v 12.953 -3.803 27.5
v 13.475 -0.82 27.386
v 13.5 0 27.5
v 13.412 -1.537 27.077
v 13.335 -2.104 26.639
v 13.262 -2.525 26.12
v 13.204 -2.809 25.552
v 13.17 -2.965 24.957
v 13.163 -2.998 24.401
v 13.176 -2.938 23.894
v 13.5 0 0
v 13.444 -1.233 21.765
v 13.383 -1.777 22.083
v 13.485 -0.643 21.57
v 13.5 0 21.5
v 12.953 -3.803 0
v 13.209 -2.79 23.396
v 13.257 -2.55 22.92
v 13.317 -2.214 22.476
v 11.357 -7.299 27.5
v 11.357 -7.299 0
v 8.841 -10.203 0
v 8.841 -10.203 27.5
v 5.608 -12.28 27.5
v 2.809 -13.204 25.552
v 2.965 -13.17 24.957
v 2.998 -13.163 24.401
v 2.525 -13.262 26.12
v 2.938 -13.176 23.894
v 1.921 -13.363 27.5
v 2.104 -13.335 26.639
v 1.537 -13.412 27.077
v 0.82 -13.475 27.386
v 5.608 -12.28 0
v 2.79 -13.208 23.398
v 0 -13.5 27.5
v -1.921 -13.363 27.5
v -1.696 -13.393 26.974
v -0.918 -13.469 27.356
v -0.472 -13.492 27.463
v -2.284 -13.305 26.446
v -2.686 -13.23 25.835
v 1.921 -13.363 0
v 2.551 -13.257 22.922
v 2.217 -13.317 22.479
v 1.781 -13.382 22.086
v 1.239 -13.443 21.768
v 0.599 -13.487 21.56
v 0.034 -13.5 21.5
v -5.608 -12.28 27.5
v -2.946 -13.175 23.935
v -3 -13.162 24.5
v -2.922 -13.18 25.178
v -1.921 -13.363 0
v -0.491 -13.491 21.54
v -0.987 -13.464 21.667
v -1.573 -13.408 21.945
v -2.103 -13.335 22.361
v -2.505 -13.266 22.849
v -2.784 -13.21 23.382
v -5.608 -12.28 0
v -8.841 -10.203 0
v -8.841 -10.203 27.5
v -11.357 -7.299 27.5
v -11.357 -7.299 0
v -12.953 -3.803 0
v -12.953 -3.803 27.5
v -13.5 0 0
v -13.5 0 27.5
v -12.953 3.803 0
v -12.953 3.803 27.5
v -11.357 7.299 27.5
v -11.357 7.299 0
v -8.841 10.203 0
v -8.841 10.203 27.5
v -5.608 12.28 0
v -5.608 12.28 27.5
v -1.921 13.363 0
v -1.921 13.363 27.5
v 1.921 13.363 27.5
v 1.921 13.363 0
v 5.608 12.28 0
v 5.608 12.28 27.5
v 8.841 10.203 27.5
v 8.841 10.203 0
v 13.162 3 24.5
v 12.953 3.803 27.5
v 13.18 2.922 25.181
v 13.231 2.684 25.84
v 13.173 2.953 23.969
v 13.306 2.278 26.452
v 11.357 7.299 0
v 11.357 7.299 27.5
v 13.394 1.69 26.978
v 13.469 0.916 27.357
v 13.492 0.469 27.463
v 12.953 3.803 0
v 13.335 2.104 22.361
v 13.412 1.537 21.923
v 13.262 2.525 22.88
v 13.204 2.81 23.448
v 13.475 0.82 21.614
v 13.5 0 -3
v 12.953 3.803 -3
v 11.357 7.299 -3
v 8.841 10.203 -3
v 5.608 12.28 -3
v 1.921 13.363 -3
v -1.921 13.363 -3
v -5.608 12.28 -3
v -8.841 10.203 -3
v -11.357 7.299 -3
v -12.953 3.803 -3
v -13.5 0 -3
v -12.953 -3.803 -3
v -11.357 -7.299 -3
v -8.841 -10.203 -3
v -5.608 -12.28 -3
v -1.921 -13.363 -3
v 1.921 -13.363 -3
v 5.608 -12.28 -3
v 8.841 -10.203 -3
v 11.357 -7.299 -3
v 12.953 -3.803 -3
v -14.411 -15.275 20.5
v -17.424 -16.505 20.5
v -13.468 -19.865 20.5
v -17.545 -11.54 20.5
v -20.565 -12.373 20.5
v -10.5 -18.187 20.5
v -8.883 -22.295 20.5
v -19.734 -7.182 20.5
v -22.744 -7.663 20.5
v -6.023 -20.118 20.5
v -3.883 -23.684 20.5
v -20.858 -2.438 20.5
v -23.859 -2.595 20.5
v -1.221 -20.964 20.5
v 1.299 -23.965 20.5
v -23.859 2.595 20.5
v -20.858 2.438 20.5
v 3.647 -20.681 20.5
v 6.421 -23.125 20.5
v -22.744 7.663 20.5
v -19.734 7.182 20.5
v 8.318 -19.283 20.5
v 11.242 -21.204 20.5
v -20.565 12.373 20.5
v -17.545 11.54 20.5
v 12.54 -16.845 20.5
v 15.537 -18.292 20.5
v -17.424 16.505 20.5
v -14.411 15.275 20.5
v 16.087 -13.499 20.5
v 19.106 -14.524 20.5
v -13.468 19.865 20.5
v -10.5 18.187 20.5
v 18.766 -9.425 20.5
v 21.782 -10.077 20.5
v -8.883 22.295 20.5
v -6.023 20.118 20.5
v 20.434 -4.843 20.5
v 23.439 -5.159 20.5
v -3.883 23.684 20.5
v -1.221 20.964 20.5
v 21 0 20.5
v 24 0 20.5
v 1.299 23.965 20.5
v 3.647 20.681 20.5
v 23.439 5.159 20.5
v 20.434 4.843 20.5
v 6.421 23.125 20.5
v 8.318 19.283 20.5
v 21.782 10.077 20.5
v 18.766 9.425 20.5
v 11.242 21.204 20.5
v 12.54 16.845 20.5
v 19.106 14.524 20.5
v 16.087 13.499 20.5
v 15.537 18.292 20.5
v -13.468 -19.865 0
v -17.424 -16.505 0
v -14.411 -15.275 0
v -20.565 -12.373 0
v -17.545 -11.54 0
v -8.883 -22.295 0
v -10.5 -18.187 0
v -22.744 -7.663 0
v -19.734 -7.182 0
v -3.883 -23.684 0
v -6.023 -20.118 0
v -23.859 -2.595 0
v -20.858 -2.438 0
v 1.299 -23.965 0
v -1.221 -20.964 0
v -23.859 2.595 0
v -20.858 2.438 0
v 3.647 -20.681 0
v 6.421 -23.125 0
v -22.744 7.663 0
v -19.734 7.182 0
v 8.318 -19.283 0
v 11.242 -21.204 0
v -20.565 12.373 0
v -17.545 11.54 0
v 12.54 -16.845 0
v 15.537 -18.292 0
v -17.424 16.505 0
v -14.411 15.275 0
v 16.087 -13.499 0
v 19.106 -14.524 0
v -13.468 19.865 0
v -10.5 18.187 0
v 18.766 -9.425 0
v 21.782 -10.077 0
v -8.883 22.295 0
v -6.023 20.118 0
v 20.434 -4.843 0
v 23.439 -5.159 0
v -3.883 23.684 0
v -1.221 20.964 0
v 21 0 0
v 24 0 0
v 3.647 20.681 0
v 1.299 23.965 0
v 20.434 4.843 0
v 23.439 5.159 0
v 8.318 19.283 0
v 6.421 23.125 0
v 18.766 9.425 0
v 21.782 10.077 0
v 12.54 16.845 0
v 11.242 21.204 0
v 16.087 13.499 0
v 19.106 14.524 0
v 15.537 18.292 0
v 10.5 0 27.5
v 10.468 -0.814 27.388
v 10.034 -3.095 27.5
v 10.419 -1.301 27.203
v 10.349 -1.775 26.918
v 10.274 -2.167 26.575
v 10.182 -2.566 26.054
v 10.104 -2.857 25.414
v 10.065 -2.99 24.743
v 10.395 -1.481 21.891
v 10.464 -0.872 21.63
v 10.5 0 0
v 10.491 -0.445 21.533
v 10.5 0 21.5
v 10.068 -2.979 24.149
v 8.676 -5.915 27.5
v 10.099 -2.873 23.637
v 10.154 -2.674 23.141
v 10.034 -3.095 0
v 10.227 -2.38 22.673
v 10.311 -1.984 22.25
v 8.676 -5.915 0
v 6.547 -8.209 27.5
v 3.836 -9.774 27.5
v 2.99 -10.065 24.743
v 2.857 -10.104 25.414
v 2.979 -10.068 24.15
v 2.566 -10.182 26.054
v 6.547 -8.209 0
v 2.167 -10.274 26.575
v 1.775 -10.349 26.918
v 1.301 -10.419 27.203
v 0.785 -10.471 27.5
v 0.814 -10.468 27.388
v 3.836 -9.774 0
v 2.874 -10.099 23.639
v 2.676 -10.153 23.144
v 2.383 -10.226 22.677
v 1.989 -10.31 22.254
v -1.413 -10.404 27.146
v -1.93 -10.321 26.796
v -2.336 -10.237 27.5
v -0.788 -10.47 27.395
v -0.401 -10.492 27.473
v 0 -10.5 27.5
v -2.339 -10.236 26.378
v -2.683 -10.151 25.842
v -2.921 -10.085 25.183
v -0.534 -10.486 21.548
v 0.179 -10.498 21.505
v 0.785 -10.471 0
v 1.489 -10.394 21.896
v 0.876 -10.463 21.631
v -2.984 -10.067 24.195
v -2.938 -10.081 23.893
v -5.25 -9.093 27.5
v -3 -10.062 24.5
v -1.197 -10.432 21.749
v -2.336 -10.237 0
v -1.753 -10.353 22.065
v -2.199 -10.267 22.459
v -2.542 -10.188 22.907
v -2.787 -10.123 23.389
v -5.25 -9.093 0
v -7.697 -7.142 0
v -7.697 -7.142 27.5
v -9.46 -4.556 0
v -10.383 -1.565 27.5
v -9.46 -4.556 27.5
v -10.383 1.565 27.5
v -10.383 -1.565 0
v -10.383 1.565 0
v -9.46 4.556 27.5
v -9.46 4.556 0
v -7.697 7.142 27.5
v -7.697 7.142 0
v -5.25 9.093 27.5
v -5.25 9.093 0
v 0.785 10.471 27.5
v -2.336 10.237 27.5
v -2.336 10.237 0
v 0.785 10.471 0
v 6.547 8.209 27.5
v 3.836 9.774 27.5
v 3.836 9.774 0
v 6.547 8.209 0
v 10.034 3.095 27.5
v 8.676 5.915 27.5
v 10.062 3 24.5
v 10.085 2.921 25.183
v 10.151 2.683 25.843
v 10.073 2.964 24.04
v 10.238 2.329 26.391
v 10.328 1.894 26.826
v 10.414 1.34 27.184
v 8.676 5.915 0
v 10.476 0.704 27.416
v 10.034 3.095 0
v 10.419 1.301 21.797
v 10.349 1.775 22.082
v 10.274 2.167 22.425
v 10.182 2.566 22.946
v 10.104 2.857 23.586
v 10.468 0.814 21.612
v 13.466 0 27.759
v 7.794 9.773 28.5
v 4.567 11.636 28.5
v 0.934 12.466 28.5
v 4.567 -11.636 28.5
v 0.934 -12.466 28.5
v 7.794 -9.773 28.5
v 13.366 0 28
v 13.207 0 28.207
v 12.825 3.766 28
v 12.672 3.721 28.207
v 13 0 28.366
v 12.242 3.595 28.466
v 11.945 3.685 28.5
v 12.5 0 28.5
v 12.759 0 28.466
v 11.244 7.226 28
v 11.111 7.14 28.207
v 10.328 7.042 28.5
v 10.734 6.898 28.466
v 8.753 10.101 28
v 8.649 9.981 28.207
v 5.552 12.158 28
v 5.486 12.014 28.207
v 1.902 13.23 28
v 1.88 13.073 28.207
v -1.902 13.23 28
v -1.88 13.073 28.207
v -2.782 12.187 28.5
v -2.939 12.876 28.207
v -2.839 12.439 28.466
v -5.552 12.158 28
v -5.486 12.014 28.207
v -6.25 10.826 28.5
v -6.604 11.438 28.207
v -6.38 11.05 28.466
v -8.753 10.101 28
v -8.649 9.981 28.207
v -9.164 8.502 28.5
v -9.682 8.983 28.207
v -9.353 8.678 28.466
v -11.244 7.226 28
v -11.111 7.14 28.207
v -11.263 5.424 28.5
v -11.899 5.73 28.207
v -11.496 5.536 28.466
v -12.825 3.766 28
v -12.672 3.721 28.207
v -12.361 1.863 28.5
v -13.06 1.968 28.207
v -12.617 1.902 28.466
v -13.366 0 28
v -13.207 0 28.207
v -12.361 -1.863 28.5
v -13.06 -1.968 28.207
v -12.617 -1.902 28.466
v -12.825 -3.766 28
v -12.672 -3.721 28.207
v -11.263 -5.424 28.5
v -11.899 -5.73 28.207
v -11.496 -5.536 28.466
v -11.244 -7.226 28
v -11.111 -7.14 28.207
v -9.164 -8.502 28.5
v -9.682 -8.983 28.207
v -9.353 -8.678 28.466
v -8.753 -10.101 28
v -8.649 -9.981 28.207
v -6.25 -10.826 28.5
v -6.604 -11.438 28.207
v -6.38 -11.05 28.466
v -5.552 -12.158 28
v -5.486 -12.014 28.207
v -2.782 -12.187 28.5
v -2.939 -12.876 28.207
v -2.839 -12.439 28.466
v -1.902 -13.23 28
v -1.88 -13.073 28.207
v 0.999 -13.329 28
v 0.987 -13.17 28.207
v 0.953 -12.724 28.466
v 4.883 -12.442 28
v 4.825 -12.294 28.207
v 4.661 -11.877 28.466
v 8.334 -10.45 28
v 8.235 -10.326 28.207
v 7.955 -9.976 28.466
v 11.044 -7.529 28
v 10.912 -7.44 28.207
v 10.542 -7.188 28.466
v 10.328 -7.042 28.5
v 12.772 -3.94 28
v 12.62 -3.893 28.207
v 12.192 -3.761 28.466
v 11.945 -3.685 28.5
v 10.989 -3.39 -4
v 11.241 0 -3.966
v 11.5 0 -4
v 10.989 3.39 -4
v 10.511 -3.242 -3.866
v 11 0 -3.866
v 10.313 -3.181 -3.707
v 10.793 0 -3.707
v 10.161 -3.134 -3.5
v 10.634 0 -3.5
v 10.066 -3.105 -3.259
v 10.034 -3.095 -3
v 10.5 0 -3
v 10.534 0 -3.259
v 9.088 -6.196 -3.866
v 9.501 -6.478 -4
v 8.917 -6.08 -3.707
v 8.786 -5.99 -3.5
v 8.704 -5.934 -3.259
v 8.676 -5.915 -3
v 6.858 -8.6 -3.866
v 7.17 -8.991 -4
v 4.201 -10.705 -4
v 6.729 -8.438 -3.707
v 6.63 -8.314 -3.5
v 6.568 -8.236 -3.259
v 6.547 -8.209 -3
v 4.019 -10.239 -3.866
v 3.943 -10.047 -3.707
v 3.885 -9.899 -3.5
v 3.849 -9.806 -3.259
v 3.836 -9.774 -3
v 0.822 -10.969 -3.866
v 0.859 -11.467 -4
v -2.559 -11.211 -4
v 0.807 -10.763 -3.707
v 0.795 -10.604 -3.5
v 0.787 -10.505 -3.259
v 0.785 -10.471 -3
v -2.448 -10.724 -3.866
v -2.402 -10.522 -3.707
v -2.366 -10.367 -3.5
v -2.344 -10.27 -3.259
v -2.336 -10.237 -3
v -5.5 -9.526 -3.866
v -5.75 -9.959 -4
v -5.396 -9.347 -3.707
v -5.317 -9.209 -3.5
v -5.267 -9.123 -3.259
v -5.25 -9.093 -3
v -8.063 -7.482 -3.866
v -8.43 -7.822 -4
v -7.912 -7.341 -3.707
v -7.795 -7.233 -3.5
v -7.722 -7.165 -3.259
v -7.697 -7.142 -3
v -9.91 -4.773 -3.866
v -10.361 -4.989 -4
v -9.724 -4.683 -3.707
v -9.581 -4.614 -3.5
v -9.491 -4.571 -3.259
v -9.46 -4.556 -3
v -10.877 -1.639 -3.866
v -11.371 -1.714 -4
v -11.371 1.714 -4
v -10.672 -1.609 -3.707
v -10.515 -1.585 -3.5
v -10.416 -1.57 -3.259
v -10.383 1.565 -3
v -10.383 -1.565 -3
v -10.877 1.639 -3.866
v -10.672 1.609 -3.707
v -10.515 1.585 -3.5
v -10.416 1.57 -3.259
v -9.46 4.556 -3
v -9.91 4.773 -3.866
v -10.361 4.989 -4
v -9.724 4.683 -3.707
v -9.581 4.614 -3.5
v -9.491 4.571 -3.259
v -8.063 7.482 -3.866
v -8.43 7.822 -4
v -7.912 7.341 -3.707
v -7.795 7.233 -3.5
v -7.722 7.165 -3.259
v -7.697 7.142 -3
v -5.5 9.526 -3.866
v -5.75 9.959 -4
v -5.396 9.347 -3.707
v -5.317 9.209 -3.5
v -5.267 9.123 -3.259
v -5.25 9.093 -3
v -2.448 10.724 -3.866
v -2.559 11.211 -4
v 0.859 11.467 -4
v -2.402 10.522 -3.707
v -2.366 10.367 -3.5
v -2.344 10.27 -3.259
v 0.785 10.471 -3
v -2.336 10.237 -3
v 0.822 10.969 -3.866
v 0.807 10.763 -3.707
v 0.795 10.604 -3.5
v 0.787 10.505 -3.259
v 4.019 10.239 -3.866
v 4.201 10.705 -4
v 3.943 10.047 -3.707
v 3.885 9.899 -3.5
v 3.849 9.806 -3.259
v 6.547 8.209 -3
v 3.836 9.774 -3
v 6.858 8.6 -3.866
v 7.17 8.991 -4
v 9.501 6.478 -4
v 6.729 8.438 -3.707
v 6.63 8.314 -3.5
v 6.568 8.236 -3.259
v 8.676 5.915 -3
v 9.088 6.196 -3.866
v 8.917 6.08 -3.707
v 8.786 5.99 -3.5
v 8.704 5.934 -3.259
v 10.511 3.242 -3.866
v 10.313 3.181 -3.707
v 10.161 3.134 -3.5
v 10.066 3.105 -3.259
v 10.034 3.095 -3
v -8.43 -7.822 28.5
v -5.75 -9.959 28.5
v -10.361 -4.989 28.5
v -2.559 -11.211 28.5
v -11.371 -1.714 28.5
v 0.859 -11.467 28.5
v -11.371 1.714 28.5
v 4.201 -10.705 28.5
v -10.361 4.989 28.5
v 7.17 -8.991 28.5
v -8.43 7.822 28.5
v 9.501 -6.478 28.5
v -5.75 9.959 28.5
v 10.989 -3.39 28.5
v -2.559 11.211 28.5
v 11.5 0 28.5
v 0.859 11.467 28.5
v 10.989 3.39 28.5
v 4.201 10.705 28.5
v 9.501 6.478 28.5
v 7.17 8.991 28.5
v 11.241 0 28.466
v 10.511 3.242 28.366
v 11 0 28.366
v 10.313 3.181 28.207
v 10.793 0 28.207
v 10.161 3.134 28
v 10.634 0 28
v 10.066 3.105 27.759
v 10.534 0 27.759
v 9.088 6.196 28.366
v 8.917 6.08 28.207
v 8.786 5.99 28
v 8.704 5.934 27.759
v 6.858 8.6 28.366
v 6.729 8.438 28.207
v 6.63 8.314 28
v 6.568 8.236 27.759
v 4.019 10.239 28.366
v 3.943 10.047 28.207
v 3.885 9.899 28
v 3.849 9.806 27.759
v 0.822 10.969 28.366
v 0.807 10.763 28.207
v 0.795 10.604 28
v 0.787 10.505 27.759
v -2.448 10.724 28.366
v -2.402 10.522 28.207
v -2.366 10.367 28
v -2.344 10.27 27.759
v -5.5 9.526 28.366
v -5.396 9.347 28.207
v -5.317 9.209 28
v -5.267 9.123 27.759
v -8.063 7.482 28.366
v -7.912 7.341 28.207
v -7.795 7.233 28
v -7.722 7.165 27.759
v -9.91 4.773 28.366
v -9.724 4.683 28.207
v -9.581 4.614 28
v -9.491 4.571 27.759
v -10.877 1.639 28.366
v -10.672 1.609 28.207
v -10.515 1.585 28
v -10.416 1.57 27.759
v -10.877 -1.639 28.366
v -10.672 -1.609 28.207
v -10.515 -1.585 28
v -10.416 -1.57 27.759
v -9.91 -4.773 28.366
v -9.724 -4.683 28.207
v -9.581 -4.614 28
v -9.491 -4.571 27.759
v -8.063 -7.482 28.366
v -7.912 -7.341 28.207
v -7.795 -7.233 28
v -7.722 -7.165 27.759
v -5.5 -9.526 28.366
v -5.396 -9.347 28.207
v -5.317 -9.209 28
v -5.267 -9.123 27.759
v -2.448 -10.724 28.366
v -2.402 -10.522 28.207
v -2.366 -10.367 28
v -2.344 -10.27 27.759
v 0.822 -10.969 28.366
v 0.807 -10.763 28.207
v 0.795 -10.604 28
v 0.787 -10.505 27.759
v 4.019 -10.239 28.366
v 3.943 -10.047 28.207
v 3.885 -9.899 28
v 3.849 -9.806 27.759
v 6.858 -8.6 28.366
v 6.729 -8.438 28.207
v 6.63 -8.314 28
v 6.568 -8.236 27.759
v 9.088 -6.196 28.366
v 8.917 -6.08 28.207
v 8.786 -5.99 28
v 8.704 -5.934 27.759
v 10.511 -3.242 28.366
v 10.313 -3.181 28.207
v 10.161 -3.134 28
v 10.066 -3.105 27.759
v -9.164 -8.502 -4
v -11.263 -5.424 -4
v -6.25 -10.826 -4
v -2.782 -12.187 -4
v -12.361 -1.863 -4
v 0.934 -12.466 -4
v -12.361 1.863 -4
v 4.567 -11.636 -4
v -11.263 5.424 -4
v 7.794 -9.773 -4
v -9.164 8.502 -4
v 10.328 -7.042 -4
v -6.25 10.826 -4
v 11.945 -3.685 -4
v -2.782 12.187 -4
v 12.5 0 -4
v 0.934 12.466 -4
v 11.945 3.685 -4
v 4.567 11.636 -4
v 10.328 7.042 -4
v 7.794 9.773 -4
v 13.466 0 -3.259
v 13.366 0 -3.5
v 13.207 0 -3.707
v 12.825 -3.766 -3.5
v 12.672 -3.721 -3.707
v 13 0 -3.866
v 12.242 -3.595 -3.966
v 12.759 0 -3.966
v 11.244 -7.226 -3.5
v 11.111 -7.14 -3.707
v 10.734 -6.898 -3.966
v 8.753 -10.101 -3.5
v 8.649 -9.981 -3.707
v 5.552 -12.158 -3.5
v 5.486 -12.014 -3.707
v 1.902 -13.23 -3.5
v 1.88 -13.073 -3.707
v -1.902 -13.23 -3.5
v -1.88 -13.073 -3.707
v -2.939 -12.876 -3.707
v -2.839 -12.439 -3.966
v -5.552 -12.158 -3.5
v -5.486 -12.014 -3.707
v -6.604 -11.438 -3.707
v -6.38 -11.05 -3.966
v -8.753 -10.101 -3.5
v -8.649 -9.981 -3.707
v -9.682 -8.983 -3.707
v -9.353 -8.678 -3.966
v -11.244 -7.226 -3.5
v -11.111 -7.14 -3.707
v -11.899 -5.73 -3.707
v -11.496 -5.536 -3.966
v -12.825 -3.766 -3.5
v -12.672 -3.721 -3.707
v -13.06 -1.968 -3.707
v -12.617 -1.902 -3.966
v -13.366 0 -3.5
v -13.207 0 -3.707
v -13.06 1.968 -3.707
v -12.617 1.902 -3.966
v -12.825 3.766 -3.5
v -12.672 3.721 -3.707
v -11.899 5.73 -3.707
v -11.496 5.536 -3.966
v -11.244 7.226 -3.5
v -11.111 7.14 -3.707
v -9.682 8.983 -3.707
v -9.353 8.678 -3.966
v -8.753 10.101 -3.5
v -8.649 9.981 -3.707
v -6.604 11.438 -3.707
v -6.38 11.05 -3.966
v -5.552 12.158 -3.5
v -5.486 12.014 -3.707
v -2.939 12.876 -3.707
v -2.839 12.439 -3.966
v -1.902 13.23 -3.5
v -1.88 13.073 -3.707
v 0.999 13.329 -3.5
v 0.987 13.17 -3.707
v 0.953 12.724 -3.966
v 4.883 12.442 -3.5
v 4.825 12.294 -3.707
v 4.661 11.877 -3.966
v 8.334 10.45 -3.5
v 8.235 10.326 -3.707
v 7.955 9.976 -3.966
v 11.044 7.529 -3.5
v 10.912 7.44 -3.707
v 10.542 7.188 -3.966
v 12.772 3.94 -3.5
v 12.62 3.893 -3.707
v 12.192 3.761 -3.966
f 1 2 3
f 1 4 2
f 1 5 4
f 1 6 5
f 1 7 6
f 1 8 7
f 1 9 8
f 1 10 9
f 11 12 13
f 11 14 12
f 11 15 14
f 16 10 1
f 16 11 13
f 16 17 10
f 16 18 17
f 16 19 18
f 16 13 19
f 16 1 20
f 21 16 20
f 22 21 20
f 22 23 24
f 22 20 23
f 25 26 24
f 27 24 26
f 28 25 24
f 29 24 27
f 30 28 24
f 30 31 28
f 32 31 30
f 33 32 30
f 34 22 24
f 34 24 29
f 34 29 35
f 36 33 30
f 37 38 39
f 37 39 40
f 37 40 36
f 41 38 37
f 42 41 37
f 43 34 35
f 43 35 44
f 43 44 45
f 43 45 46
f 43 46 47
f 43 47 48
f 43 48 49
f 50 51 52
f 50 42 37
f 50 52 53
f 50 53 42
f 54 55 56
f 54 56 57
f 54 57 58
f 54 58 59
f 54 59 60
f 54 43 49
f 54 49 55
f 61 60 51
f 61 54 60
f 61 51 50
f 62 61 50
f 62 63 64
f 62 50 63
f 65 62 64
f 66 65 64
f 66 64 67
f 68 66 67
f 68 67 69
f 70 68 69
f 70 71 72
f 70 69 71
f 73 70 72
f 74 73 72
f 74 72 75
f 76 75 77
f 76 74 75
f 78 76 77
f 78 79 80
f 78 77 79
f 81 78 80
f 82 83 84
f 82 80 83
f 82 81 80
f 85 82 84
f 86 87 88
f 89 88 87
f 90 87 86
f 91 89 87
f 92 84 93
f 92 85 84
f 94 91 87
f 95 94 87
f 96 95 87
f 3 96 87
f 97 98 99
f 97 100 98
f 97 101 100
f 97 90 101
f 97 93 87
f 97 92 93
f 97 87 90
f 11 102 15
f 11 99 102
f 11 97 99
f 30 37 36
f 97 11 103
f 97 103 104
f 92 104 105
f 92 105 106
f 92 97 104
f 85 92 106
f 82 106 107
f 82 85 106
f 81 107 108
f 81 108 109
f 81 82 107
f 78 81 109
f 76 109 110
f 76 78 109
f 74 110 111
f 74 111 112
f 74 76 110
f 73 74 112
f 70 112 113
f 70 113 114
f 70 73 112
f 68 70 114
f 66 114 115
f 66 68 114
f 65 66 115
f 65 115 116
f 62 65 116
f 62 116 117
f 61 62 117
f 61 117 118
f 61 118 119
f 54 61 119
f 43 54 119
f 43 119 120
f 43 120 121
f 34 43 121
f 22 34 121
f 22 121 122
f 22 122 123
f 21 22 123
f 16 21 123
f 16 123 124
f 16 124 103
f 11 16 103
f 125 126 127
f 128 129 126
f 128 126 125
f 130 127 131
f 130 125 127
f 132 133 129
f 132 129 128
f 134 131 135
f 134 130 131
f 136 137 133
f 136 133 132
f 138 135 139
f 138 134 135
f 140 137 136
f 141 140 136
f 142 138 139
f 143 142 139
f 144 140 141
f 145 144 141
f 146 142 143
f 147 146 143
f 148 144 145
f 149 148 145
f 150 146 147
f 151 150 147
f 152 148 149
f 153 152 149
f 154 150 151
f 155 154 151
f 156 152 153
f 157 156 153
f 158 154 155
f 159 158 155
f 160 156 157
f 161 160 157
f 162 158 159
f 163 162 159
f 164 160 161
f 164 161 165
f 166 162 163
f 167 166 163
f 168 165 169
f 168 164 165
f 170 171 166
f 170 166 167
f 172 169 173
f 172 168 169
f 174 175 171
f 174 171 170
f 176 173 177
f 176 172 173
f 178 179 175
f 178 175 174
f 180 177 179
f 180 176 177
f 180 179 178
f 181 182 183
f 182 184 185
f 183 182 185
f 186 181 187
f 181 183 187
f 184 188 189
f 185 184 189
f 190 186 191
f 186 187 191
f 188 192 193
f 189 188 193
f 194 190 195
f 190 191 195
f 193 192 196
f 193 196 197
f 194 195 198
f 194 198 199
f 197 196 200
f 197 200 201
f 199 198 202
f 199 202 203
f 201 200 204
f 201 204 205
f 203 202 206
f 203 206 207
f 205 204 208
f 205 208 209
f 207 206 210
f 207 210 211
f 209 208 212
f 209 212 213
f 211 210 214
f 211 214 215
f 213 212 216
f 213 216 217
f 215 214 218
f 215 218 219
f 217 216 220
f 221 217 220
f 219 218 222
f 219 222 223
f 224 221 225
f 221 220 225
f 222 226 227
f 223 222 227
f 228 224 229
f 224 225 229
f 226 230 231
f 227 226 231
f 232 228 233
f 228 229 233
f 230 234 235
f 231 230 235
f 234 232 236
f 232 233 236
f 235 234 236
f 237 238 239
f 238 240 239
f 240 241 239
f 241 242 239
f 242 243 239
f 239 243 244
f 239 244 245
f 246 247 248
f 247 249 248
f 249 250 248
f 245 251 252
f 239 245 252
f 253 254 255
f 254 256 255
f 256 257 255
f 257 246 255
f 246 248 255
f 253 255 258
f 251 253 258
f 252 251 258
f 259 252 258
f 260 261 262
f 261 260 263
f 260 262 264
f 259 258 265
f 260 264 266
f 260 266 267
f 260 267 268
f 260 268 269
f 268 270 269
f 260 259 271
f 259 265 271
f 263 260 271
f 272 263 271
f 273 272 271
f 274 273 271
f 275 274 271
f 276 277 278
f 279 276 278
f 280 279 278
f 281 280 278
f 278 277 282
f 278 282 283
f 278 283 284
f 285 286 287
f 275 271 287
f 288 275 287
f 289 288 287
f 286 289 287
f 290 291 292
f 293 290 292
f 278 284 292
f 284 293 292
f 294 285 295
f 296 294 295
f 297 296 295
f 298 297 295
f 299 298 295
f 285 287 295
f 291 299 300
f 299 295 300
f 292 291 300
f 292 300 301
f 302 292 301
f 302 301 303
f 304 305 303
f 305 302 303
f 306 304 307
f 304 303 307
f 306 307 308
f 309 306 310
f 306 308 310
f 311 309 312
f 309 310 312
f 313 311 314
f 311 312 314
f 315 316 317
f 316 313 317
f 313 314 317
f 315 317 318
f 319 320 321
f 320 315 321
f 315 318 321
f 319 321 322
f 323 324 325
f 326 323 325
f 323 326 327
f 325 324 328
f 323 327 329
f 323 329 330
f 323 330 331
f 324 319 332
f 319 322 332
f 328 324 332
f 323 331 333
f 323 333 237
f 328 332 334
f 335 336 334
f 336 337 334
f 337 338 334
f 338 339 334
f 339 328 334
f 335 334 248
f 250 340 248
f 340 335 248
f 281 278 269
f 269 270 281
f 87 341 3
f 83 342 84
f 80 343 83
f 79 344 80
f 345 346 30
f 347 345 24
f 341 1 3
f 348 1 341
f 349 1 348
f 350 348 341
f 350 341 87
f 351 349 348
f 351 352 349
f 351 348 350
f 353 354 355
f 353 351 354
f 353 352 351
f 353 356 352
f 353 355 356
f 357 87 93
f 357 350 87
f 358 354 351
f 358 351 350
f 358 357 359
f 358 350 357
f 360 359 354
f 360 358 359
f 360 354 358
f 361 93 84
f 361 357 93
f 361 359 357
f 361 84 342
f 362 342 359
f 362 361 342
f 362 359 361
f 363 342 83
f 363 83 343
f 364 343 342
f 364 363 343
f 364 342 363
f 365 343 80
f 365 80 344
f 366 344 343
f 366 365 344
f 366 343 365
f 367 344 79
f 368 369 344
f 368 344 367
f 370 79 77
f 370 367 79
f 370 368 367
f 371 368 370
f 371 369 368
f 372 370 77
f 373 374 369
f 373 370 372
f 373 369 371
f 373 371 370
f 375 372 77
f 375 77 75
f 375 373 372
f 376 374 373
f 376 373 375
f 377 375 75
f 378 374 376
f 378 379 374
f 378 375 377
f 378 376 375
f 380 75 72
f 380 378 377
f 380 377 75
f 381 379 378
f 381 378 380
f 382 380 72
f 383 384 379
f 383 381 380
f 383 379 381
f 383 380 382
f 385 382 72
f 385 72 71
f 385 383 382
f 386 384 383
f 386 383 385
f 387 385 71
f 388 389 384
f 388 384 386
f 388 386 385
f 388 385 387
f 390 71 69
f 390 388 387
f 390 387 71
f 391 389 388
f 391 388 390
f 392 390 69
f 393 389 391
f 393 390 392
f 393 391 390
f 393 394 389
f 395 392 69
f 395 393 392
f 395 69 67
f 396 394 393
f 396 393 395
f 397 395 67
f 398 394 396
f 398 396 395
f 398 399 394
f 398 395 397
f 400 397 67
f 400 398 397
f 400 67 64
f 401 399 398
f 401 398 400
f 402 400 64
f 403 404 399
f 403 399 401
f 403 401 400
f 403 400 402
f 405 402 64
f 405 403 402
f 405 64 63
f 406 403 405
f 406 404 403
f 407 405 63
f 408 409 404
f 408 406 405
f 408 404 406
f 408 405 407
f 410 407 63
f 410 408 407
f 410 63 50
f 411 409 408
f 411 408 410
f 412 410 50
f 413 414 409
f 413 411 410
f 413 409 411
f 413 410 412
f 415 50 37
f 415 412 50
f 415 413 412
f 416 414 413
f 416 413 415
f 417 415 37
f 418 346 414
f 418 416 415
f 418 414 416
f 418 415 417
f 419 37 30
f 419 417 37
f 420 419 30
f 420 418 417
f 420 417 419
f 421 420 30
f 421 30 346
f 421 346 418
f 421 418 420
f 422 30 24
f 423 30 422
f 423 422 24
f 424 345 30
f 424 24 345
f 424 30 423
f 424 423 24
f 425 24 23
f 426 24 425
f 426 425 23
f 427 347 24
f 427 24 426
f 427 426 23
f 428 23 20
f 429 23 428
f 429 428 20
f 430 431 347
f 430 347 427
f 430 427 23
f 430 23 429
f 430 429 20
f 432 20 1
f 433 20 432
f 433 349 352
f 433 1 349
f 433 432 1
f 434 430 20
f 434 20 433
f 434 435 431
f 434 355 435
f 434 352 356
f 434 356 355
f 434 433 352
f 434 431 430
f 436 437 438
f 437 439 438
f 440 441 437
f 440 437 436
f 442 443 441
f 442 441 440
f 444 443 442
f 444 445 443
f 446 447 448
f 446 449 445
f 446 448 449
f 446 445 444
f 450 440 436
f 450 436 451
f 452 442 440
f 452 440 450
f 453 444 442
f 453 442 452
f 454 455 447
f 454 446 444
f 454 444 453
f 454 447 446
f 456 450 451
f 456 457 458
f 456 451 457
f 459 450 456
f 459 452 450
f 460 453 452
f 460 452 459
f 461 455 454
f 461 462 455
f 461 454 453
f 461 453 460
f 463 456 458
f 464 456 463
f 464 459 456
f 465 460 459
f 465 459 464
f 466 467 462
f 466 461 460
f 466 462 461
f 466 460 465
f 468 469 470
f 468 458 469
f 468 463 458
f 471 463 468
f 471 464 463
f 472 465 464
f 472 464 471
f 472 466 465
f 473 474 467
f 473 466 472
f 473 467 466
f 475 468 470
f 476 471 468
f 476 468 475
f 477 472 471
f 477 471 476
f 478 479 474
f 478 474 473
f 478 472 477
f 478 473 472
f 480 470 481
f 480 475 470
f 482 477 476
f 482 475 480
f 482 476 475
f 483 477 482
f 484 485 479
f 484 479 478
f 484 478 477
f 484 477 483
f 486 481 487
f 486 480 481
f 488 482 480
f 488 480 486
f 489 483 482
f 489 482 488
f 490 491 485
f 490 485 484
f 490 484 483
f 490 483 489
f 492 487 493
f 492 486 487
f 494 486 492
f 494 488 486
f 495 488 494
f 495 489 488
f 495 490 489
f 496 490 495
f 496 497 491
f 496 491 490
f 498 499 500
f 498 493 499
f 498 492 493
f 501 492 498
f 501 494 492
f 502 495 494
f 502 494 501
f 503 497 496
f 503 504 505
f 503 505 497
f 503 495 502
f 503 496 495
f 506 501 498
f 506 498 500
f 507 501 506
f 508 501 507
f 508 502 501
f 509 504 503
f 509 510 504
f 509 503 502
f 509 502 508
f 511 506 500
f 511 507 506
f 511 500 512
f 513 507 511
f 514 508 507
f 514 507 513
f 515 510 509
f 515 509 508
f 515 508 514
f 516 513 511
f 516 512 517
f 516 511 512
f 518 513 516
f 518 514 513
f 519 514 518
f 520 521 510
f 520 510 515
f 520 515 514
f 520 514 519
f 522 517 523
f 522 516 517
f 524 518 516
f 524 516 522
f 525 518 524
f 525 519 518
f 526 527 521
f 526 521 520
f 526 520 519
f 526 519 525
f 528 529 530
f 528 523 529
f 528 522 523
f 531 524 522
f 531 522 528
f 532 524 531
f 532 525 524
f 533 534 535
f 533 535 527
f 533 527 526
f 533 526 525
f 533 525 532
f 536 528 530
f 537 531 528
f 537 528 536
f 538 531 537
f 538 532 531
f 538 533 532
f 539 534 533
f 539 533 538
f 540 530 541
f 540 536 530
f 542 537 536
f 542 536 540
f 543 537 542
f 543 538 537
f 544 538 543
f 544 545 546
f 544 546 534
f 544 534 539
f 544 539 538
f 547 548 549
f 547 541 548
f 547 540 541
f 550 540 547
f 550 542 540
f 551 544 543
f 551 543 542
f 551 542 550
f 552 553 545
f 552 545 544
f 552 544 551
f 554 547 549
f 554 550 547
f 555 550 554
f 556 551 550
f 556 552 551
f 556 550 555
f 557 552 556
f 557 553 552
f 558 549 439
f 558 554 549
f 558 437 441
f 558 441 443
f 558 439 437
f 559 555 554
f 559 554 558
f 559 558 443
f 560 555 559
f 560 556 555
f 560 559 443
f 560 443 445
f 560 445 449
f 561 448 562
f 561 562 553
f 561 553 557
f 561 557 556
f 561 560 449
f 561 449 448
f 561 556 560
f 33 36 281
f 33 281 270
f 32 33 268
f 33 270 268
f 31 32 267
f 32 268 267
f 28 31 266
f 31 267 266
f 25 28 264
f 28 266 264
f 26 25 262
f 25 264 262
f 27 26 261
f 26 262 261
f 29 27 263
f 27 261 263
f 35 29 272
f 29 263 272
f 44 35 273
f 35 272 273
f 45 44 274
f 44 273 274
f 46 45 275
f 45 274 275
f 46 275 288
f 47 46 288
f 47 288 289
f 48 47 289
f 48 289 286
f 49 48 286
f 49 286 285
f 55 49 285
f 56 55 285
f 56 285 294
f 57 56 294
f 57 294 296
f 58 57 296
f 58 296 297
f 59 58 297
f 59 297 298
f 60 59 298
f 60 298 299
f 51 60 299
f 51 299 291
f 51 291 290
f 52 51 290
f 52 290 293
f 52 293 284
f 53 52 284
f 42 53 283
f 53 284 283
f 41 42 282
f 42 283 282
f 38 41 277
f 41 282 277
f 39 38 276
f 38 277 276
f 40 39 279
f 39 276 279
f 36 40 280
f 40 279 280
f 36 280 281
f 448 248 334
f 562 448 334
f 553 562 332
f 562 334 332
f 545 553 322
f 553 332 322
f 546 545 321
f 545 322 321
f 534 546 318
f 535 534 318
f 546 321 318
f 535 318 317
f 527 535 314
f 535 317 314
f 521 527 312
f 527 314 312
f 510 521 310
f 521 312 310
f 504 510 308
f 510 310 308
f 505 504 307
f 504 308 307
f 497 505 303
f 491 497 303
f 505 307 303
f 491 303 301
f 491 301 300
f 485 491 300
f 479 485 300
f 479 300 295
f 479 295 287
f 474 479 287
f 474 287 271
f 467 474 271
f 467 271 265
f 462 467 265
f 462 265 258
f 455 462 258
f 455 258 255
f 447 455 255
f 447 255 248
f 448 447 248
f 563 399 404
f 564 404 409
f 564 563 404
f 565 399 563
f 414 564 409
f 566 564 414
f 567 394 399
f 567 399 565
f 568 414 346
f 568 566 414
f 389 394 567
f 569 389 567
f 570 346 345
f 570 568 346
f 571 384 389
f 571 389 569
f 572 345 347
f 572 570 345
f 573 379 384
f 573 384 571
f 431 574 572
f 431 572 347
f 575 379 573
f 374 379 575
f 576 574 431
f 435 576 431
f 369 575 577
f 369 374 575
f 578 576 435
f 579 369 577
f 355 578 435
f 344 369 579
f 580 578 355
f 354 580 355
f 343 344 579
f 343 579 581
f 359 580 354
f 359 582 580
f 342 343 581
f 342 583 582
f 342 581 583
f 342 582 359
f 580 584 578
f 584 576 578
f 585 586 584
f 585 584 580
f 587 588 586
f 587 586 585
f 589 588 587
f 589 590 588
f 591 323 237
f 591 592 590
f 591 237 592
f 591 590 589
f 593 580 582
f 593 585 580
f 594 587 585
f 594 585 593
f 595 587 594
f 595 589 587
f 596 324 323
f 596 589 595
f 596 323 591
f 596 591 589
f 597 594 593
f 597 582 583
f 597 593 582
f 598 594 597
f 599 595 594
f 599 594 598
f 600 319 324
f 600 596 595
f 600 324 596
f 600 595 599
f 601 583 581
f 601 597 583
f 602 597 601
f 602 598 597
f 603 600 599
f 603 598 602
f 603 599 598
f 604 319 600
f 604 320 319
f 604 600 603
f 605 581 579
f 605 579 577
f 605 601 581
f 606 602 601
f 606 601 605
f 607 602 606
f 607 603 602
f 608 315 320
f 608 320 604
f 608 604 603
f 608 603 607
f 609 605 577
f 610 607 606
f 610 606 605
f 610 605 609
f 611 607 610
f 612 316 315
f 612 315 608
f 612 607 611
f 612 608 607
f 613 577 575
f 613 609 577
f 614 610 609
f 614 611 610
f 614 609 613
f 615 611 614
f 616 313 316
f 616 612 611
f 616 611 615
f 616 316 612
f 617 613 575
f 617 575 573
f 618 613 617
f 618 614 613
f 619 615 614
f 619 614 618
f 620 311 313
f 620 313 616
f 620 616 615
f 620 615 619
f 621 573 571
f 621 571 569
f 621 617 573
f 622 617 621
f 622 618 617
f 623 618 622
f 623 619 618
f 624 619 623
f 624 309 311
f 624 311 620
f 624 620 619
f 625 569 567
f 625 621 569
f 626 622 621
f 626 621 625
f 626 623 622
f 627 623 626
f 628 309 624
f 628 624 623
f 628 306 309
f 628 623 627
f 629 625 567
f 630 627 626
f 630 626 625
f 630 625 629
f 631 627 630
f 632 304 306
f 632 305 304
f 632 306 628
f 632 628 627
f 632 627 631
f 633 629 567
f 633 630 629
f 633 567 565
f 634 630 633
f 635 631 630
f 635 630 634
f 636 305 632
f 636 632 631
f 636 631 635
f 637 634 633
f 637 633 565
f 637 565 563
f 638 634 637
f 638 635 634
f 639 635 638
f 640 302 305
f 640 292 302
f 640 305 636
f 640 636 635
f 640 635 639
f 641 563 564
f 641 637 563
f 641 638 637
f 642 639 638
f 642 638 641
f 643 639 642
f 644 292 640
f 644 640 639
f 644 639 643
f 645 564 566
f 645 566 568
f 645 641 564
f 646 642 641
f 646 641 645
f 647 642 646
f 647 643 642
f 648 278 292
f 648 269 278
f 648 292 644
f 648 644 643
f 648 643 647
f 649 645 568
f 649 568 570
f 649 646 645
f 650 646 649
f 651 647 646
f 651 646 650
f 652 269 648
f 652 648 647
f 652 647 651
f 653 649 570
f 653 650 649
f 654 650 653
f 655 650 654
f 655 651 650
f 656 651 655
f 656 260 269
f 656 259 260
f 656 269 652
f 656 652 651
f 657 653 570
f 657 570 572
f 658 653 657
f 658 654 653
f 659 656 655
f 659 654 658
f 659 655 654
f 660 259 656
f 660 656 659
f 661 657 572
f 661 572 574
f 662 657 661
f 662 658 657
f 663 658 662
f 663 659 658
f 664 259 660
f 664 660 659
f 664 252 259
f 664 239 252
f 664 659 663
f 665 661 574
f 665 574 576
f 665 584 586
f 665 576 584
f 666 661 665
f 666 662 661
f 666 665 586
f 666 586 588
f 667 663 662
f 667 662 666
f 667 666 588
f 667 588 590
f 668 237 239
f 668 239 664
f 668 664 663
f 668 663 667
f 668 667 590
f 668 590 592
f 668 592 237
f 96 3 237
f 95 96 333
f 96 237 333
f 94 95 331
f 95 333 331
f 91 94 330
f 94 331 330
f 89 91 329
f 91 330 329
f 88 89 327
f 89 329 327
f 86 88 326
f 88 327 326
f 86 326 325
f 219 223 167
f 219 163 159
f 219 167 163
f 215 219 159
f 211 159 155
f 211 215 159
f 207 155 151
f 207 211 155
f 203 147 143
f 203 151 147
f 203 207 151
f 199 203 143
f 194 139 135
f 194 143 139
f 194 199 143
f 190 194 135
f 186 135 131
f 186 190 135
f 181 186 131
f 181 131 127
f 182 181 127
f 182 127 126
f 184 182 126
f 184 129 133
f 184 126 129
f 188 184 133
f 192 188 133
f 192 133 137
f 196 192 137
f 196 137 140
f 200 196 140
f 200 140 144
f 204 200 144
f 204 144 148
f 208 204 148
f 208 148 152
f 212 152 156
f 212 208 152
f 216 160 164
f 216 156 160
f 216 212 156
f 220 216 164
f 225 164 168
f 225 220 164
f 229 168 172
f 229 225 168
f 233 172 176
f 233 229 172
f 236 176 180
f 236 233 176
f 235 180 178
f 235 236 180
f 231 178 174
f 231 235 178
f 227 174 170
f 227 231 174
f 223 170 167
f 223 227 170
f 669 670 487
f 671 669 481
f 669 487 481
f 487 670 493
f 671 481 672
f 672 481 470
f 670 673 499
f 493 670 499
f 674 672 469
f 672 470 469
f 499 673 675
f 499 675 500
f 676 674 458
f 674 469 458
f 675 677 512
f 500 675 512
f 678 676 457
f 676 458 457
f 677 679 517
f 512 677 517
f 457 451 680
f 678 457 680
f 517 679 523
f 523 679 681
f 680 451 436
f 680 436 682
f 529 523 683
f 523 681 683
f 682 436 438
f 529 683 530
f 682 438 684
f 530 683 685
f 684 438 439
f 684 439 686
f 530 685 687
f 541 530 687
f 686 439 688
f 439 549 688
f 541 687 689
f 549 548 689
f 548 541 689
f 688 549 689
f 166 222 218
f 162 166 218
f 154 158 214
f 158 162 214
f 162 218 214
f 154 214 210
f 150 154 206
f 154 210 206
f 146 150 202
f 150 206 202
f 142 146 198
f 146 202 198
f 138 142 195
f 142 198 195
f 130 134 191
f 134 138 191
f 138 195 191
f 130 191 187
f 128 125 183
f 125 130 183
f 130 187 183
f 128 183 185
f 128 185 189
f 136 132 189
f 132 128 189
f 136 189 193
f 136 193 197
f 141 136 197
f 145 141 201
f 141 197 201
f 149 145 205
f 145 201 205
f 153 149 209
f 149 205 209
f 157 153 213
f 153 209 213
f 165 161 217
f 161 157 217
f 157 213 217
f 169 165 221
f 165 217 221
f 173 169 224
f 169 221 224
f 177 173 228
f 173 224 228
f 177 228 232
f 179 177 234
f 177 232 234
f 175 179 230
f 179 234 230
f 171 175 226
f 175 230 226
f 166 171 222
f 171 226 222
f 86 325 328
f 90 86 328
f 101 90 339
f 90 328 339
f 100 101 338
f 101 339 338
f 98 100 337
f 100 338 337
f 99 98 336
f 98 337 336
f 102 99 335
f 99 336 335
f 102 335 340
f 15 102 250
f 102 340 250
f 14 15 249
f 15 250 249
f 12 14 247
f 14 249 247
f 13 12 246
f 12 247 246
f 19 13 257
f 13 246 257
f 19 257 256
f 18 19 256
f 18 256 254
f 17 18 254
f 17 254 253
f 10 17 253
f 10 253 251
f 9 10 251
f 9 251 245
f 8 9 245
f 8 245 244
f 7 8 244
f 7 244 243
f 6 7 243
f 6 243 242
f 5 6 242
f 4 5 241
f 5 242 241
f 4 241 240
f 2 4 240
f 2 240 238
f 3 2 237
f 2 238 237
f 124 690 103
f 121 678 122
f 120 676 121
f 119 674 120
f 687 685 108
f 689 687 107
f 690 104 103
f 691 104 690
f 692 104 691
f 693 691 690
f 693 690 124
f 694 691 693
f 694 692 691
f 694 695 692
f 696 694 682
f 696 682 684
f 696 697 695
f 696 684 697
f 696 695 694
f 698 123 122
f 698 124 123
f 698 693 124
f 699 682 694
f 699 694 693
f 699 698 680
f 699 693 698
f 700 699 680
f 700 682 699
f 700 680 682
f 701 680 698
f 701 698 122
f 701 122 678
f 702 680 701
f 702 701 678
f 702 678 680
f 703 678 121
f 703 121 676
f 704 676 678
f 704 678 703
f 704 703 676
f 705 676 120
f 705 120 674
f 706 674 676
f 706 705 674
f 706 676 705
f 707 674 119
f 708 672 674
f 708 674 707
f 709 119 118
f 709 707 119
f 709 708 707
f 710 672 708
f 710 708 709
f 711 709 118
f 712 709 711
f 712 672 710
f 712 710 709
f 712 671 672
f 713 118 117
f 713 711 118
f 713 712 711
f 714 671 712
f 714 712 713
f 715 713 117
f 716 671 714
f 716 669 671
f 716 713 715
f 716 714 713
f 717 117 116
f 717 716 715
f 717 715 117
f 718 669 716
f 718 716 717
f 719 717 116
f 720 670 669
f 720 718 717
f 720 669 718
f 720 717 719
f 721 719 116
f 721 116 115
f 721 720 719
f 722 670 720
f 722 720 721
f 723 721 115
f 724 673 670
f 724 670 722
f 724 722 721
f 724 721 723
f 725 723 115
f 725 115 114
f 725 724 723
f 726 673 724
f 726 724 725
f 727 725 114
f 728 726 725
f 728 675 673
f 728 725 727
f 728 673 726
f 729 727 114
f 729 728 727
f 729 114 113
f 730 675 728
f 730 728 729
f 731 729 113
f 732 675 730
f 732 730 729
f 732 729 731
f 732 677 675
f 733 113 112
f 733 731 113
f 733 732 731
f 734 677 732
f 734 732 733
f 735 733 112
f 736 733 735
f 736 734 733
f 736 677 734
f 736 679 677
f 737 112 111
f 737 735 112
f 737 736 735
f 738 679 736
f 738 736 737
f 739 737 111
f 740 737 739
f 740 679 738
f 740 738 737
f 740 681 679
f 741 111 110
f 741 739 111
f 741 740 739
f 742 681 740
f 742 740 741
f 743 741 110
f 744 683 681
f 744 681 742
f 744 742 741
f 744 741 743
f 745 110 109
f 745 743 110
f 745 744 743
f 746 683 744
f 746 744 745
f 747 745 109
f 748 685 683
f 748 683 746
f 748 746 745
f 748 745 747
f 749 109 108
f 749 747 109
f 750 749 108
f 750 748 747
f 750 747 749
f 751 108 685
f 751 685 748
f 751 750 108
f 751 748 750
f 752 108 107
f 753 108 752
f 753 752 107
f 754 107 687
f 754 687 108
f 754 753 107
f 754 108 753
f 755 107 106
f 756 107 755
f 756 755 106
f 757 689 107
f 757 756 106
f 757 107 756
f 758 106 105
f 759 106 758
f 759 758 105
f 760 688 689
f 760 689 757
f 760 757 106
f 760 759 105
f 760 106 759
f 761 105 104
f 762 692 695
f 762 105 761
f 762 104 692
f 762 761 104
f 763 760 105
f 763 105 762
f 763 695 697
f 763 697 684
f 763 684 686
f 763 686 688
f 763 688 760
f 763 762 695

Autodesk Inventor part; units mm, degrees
ref_plane "YZ Plane" through (0, 0, 0) normal (1, 0, 0) x (0, 1, 0)
ref_plane "XZ Plane" through (0, 0, 0) normal (0, 1, 0) x (-1, 0, 0)
ref_plane "XY Plane" through (0, 0, 0) normal (0, 0, 1) x (1, 0, 0)
sketch "Sketch1" plane through (0, 0, 0) normal (0, 0, 1) x (1, 0, 0)
  circle A0 centre (0, 0) radius 24
  circle A1 centre (0, 0) radius 21
  circle A2 centre (0, 0) radius 10.5
  circle A3 centre (0, 0) radius 13.5
  dimension "d0" = 48
  dimension "d1" = 3
  dimension "d2" = 21
  dimension "d3" = 3
extrude "Extrusion1" add sketch "Sketch1" along normal blind 20.5 contours A0
extrude "Extrusion2" add sketch "Sketch1" along normal blind 28.5 and the other way blind 4 contours A3
sketch "Sketch2" plane through (0, 0, 0) normal (0, 1, 0) x (-1, 0, 0)
  line L0 (-13.5, -4) -> (-13.5, 28.5) projected
  line L1 (-10.5, 28.5) -> (10.5, 28.5) projected
  line L2 (0, 28.5) -> (0, 24.5)
  circle A0 centre (0, 24.5) radius 3
  point P0 (0, 0)
  dimension "d10" = 4
  dimension "d11" = 6
extrude "Extrusion3" cut sketch "Sketch2" against normal blind 28.5
sketch "Sketch3" plane through (0, 0, 0) normal (1, 0, 0) x (0, 1, 0)
  line L0 (-10.5, 28.5) -> (10.5, 28.5) projected
  line L1 (0, 28.5) -> (0, 24.5)
  circle A0 centre (0, 24.5) radius 3
  point P0 (0, 0)
  dimension "d14" = 4
  dimension "d15" = 6
extrude "Extrusion4" cut sketch "Sketch3" along normal blind 28.5
fillet "Fillet1" radius 1 4 edges at (-13.5, 0, 28.5) (-10.5, 0, 28.5) (-13.5, 0, -4) (-10.5, 0, -4)
properties part number "2"
